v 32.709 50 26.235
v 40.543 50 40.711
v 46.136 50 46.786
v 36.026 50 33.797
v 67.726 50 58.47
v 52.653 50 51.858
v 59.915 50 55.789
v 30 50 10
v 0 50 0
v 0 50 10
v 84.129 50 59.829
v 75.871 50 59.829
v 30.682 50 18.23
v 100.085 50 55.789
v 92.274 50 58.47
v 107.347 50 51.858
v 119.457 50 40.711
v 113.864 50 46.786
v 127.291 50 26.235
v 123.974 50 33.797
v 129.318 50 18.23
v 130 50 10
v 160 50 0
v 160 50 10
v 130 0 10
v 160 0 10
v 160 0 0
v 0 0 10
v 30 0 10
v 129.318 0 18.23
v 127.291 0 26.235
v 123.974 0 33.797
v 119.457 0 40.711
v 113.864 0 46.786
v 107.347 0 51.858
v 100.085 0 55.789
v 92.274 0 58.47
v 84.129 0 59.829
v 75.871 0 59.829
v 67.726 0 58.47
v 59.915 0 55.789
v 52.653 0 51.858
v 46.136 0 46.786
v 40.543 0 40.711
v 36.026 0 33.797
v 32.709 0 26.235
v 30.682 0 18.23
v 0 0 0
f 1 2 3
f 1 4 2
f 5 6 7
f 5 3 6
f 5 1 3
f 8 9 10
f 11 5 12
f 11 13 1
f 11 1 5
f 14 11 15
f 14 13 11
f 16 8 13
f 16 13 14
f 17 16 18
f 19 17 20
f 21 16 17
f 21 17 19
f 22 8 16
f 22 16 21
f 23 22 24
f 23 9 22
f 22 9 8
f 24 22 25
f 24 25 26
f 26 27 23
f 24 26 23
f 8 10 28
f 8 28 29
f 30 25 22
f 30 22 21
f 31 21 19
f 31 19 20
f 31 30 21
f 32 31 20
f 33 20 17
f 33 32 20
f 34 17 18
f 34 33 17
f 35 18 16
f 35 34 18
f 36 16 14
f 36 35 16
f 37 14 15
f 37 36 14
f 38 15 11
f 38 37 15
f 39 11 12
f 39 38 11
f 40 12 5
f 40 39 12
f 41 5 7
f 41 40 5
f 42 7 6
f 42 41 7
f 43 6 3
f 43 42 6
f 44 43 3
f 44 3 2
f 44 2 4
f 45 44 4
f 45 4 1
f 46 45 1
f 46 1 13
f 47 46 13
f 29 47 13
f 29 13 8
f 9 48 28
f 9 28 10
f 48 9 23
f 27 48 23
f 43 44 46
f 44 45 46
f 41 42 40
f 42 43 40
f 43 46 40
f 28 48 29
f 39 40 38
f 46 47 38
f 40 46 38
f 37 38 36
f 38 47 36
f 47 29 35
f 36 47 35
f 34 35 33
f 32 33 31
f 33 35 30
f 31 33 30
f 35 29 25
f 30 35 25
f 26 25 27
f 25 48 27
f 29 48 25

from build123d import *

# Parameters (mm, degrees)
CROQUIS1_W              = 160
CROQUIS1_H              = 50
SALIENTE_EXTRUIR1_DEPTH = 10
SALIENTE_EXTRUIR2_DEPTH = 50


with BuildPart() as part:
    # Croquis1 → Saliente-Extruir1 (new body)
    with BuildSketch(Plane.XY):
        with Locations((80, 25)):
            Rectangle(CROQUIS1_W, CROQUIS1_H)
    extrude(amount=SALIENTE_EXTRUIR1_DEPTH)

    # Croquis3 → Saliente-Extruir2 (add)
    with BuildSketch(Plane.XZ):
        with BuildLine():
            Line((30, 10), (130, 10))
            ThreePointArc((130, 10), (80, 60), (30, 10))
        make_face()
    extrude(amount=-SALIENTE_EXTRUIR2_DEPTH)


solid = part.part
